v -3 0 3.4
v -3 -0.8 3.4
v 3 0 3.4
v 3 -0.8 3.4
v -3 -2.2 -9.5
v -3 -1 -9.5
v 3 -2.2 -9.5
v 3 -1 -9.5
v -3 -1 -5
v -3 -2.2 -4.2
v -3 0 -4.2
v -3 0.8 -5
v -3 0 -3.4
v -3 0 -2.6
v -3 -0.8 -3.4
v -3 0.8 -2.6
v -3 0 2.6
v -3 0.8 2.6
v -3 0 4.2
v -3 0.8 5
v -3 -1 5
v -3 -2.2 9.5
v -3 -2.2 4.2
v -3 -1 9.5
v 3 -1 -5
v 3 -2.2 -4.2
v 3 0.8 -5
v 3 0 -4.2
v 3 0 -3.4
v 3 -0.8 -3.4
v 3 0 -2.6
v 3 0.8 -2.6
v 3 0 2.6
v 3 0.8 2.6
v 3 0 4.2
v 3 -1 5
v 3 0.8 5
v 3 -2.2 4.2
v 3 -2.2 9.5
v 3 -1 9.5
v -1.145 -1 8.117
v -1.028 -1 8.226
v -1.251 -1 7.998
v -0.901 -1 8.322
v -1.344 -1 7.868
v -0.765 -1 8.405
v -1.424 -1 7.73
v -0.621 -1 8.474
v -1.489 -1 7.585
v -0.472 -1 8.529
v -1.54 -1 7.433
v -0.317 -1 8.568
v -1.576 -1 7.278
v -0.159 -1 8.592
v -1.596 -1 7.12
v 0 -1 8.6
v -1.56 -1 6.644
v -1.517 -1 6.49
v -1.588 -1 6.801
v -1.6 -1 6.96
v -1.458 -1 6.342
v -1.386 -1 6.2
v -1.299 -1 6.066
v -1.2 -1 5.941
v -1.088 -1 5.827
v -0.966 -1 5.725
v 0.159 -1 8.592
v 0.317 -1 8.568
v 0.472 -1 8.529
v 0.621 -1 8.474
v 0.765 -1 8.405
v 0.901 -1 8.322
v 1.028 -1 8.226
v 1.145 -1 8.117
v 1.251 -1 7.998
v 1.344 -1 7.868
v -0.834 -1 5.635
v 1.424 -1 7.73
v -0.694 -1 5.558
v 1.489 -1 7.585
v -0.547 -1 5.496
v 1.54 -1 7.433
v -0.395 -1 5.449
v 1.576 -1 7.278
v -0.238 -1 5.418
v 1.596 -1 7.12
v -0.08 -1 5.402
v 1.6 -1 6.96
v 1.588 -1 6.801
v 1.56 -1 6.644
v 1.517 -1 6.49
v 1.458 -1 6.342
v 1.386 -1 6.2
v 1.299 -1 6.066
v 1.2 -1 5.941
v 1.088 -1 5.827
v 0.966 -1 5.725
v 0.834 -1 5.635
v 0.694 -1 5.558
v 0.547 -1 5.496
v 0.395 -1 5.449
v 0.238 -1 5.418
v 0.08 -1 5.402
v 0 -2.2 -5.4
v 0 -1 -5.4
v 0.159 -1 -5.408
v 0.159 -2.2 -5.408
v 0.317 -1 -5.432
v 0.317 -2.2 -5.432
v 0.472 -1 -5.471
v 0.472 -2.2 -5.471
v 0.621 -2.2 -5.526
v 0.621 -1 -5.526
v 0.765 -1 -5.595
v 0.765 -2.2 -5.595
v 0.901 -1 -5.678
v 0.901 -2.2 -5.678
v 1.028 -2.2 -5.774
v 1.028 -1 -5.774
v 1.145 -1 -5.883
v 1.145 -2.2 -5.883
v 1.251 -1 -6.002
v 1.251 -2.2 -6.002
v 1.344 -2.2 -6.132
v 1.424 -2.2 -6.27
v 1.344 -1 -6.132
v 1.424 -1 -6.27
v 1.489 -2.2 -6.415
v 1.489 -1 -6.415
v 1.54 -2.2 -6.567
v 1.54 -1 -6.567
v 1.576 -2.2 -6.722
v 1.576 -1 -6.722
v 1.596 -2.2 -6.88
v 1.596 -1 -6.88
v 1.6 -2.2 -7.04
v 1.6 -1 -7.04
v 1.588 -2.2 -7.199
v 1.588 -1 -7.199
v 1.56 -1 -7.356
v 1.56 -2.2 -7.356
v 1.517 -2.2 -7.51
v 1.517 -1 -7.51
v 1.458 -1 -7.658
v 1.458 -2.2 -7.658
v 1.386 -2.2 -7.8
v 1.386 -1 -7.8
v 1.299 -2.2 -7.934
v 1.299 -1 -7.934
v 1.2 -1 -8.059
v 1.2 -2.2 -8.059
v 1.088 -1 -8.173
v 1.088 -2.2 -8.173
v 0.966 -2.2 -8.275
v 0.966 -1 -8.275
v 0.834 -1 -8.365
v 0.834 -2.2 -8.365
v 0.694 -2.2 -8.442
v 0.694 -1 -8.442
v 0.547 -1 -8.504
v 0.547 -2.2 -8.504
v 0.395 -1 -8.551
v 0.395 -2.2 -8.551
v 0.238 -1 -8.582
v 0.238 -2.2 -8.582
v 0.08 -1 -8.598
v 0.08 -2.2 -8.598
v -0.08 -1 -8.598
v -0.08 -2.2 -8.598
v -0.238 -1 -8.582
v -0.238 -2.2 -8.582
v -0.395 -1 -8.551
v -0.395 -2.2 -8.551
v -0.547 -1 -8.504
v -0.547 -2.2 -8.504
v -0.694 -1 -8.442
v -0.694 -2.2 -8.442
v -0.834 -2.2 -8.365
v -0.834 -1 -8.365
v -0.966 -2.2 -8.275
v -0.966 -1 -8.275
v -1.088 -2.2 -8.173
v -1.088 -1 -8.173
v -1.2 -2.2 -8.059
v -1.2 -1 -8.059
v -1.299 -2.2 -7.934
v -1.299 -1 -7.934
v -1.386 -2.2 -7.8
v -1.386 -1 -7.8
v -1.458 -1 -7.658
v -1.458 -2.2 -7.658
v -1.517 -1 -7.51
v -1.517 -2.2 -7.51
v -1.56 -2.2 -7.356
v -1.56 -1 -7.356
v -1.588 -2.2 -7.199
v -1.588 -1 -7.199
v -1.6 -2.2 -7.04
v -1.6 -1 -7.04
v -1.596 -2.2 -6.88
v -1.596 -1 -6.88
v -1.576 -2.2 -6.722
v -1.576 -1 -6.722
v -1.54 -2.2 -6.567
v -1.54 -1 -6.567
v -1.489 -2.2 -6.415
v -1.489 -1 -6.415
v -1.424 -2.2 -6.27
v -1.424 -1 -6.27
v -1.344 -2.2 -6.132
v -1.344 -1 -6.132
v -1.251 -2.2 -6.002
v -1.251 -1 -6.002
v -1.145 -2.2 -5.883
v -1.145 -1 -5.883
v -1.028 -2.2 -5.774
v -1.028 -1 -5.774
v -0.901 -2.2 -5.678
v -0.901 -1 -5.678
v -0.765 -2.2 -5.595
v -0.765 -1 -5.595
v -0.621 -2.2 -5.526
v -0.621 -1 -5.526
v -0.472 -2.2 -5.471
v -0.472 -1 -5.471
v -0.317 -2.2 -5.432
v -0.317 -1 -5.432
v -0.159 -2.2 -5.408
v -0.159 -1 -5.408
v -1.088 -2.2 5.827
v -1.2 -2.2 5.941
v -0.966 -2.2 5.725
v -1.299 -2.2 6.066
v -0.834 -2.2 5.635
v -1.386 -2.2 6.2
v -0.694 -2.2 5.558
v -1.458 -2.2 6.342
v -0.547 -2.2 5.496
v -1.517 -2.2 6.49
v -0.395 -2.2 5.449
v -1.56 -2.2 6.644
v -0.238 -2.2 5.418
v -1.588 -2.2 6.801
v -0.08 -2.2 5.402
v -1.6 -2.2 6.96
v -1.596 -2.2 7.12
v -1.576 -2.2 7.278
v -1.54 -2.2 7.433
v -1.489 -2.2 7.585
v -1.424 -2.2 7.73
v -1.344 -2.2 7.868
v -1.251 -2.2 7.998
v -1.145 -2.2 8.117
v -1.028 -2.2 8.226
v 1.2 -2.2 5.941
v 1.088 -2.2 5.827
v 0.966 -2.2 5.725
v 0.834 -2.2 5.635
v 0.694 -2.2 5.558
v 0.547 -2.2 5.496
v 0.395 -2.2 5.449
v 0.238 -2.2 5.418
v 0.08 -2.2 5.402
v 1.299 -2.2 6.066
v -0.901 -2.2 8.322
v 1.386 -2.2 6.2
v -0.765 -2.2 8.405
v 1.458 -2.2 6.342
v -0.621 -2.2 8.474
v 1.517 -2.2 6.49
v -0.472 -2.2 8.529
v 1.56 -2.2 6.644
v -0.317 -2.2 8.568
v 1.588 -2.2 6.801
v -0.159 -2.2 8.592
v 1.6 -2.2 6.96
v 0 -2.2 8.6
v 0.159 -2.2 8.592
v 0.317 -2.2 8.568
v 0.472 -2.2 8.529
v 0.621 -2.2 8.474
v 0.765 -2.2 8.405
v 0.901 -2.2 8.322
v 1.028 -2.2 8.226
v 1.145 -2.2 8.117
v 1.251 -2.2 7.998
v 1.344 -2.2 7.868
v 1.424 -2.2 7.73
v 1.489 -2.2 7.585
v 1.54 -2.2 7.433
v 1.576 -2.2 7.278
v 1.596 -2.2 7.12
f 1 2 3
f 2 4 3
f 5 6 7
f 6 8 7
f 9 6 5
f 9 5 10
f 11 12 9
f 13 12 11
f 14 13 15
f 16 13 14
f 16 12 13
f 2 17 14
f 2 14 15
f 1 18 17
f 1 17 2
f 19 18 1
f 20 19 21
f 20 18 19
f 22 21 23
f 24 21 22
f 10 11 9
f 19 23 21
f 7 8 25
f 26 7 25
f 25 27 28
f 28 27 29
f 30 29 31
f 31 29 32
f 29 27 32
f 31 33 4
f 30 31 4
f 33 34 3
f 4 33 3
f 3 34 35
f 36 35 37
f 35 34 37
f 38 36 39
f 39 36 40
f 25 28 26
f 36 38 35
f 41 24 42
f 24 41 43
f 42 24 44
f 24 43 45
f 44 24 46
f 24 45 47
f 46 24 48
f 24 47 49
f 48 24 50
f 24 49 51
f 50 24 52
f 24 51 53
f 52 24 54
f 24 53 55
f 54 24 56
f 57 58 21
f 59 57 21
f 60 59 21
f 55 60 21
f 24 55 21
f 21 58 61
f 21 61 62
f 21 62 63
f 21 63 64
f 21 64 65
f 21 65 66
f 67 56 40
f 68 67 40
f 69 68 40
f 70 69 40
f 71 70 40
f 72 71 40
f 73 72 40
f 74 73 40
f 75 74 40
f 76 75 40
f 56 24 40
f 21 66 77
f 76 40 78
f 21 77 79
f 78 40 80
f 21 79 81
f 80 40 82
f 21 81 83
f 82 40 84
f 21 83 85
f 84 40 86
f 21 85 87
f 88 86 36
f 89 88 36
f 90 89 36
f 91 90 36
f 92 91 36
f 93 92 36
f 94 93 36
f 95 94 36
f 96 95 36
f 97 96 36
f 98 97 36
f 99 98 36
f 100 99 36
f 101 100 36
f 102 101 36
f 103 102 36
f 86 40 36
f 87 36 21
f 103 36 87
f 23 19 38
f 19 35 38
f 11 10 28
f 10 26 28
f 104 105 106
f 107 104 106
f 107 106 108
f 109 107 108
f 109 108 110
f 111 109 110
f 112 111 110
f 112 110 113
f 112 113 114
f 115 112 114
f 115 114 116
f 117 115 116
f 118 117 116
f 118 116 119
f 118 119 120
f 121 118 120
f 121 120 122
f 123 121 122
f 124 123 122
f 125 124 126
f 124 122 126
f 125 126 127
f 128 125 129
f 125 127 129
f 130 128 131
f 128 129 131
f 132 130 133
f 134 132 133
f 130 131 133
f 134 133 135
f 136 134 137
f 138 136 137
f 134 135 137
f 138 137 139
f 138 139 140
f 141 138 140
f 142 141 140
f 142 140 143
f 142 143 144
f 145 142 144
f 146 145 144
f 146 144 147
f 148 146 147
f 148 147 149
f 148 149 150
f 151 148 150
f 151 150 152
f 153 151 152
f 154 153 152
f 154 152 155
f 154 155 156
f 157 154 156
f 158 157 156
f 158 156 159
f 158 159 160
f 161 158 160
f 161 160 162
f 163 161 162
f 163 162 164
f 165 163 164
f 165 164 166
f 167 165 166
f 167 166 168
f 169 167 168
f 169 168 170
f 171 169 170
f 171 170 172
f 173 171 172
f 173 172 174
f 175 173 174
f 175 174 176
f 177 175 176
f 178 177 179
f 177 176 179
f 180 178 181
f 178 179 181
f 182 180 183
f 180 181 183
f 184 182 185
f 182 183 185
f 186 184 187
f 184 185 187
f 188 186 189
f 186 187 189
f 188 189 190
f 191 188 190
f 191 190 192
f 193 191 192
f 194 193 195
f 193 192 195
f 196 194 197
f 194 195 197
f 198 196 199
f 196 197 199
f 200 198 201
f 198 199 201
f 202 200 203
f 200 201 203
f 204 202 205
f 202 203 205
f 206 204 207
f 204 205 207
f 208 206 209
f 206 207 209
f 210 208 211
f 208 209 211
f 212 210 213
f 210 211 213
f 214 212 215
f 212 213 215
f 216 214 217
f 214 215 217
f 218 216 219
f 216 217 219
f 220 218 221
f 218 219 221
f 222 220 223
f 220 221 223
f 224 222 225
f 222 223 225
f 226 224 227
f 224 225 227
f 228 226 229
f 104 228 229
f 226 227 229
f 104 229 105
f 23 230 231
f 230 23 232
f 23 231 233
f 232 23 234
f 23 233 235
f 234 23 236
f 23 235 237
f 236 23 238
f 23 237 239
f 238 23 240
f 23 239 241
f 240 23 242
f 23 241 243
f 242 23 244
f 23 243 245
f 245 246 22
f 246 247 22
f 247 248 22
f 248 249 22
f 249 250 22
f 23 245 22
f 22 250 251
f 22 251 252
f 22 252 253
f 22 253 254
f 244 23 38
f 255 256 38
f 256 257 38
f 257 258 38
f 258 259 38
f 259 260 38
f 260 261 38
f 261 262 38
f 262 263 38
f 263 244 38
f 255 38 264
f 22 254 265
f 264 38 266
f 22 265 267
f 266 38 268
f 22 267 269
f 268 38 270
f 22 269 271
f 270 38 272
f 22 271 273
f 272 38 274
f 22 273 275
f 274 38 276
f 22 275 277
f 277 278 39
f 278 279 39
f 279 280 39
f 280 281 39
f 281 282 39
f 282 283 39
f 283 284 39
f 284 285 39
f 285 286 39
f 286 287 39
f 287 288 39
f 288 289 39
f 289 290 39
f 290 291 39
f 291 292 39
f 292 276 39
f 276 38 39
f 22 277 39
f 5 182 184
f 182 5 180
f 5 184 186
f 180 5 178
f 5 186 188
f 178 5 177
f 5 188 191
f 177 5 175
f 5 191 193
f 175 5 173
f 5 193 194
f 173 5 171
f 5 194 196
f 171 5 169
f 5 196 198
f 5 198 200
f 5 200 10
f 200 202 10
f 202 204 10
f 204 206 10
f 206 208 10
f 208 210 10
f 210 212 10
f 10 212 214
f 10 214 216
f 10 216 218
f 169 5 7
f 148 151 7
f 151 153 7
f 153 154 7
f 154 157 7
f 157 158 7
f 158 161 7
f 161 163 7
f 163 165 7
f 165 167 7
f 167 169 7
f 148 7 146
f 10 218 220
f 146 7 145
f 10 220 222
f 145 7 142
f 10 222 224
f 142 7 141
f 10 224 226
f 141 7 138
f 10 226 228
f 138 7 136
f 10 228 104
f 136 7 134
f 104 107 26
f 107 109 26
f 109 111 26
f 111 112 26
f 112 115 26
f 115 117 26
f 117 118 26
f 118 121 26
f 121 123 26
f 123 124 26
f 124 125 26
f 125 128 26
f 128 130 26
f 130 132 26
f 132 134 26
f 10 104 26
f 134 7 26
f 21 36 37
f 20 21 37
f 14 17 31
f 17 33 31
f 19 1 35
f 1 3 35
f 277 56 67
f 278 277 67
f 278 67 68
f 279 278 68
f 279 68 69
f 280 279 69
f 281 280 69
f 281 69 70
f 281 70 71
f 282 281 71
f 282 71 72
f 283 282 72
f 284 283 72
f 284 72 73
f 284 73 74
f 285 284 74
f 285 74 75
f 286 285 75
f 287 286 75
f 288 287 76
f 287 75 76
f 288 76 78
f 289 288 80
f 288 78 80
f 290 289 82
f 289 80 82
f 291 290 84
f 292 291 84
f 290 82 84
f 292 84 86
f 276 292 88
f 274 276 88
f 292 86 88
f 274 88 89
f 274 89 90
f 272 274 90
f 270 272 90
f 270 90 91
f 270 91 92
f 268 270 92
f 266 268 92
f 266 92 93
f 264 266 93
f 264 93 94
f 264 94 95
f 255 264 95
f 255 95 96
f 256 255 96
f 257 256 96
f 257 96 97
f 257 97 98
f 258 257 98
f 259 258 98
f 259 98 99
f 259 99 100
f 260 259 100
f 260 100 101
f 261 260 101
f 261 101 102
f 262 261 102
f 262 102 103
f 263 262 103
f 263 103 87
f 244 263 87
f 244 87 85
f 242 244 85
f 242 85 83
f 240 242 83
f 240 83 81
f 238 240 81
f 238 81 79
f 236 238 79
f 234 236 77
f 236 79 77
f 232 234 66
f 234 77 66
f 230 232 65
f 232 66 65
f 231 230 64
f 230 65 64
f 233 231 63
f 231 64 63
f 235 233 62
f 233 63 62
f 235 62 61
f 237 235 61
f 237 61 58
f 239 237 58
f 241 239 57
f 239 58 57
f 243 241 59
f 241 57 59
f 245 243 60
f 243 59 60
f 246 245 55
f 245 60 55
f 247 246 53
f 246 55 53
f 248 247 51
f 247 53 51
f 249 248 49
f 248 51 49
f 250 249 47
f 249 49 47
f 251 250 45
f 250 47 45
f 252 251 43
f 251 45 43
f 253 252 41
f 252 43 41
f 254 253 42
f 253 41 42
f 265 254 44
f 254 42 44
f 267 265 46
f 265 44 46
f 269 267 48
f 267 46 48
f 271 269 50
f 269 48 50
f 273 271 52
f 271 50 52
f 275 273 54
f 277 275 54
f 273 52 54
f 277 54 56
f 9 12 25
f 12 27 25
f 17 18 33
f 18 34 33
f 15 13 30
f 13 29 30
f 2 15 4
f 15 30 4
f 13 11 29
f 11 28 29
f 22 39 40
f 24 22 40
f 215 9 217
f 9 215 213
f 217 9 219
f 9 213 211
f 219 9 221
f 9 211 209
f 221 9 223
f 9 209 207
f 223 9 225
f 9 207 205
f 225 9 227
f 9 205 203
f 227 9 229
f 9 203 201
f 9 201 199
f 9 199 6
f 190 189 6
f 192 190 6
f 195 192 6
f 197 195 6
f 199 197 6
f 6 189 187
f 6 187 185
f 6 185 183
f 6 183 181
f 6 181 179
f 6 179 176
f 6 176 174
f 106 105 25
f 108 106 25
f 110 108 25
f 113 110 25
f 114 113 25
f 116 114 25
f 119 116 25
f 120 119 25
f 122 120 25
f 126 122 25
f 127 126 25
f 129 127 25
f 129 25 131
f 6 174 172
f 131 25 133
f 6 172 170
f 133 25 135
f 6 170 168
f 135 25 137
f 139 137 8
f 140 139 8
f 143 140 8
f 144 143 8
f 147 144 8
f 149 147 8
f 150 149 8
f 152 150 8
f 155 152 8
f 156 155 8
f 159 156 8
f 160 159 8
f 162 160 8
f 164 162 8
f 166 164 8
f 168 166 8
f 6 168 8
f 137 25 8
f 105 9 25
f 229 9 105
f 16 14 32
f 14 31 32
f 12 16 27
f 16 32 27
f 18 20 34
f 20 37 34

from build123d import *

# Parameters (mm, degrees)
BOSS_EXTRUDE4_DEPTH = 3
CUT_EXTRUDE1_REACH  = 12.124
SKETCH5_R           = 1.6


with BuildPart() as part:
    # Sketch4 → Boss-Extrude4 (new, symmetric)
    with BuildSketch(Plane(origin=(0, 0, 0), x_dir=(0, 0, -1), z_dir=(1, 0, 0))):
        Polygon((-5, -1), (-5, 0.8), (-2.6, 0.8), (-2.6, 0), (2.6, 0), (2.6, 0.8), (5, 0.8), (5, -1), (9.5, -1), (9.5, -2.2), (4.2, -2.2), (4.2, 0), (3.4, 0), (3.4, -0.8), (-3.4, -0.8), (-3.4, 0), (-4.2, 0), (-4.2, -2.2), (-9.5, -2.2), (-9.5, -1), align=None)
    extrude(amount=BOSS_EXTRUDE4_DEPTH, both=True)

    # Sketch5 → Cut-Extrude1 (cut, up to next)
    with BuildSketch(Plane(origin=(0, -1, 0), x_dir=(1, 0, 0), z_dir=(0, 1, 0)), mode=Mode.PRIVATE) as cut_extrude1_sk1:
        with Locations(Location((0, -7, 0), (0, 0, 270))):
            Circle(SKETCH5_R)
    cut_extrude1_tool1 = extrude(cut_extrude1_sk1.sketch, amount=-CUT_EXTRUDE1_REACH, mode=Mode.PRIVATE) & part.part
    # Sketch5 → Cut-Extrude1 (cut, up to next)
    with BuildSketch(Plane(origin=(0, -1, 0), x_dir=(1, 0, 0), z_dir=(0, 1, 0)), mode=Mode.PRIVATE) as cut_extrude1_sk2:
        with Locations(Location((0, 7, 0), (0, 0, 270))):
            Circle(SKETCH5_R)
    cut_extrude1_tool2 = extrude(cut_extrude1_sk2.sketch, amount=-CUT_EXTRUDE1_REACH, mode=Mode.PRIVATE) & part.part
    add(cut_extrude1_tool1.solids().sort_by_distance((0, -1, 7))[0], mode=Mode.SUBTRACT)
    add(cut_extrude1_tool2.solids().sort_by_distance((0, -1, -7))[0], mode=Mode.SUBTRACT)


solid = part.part
